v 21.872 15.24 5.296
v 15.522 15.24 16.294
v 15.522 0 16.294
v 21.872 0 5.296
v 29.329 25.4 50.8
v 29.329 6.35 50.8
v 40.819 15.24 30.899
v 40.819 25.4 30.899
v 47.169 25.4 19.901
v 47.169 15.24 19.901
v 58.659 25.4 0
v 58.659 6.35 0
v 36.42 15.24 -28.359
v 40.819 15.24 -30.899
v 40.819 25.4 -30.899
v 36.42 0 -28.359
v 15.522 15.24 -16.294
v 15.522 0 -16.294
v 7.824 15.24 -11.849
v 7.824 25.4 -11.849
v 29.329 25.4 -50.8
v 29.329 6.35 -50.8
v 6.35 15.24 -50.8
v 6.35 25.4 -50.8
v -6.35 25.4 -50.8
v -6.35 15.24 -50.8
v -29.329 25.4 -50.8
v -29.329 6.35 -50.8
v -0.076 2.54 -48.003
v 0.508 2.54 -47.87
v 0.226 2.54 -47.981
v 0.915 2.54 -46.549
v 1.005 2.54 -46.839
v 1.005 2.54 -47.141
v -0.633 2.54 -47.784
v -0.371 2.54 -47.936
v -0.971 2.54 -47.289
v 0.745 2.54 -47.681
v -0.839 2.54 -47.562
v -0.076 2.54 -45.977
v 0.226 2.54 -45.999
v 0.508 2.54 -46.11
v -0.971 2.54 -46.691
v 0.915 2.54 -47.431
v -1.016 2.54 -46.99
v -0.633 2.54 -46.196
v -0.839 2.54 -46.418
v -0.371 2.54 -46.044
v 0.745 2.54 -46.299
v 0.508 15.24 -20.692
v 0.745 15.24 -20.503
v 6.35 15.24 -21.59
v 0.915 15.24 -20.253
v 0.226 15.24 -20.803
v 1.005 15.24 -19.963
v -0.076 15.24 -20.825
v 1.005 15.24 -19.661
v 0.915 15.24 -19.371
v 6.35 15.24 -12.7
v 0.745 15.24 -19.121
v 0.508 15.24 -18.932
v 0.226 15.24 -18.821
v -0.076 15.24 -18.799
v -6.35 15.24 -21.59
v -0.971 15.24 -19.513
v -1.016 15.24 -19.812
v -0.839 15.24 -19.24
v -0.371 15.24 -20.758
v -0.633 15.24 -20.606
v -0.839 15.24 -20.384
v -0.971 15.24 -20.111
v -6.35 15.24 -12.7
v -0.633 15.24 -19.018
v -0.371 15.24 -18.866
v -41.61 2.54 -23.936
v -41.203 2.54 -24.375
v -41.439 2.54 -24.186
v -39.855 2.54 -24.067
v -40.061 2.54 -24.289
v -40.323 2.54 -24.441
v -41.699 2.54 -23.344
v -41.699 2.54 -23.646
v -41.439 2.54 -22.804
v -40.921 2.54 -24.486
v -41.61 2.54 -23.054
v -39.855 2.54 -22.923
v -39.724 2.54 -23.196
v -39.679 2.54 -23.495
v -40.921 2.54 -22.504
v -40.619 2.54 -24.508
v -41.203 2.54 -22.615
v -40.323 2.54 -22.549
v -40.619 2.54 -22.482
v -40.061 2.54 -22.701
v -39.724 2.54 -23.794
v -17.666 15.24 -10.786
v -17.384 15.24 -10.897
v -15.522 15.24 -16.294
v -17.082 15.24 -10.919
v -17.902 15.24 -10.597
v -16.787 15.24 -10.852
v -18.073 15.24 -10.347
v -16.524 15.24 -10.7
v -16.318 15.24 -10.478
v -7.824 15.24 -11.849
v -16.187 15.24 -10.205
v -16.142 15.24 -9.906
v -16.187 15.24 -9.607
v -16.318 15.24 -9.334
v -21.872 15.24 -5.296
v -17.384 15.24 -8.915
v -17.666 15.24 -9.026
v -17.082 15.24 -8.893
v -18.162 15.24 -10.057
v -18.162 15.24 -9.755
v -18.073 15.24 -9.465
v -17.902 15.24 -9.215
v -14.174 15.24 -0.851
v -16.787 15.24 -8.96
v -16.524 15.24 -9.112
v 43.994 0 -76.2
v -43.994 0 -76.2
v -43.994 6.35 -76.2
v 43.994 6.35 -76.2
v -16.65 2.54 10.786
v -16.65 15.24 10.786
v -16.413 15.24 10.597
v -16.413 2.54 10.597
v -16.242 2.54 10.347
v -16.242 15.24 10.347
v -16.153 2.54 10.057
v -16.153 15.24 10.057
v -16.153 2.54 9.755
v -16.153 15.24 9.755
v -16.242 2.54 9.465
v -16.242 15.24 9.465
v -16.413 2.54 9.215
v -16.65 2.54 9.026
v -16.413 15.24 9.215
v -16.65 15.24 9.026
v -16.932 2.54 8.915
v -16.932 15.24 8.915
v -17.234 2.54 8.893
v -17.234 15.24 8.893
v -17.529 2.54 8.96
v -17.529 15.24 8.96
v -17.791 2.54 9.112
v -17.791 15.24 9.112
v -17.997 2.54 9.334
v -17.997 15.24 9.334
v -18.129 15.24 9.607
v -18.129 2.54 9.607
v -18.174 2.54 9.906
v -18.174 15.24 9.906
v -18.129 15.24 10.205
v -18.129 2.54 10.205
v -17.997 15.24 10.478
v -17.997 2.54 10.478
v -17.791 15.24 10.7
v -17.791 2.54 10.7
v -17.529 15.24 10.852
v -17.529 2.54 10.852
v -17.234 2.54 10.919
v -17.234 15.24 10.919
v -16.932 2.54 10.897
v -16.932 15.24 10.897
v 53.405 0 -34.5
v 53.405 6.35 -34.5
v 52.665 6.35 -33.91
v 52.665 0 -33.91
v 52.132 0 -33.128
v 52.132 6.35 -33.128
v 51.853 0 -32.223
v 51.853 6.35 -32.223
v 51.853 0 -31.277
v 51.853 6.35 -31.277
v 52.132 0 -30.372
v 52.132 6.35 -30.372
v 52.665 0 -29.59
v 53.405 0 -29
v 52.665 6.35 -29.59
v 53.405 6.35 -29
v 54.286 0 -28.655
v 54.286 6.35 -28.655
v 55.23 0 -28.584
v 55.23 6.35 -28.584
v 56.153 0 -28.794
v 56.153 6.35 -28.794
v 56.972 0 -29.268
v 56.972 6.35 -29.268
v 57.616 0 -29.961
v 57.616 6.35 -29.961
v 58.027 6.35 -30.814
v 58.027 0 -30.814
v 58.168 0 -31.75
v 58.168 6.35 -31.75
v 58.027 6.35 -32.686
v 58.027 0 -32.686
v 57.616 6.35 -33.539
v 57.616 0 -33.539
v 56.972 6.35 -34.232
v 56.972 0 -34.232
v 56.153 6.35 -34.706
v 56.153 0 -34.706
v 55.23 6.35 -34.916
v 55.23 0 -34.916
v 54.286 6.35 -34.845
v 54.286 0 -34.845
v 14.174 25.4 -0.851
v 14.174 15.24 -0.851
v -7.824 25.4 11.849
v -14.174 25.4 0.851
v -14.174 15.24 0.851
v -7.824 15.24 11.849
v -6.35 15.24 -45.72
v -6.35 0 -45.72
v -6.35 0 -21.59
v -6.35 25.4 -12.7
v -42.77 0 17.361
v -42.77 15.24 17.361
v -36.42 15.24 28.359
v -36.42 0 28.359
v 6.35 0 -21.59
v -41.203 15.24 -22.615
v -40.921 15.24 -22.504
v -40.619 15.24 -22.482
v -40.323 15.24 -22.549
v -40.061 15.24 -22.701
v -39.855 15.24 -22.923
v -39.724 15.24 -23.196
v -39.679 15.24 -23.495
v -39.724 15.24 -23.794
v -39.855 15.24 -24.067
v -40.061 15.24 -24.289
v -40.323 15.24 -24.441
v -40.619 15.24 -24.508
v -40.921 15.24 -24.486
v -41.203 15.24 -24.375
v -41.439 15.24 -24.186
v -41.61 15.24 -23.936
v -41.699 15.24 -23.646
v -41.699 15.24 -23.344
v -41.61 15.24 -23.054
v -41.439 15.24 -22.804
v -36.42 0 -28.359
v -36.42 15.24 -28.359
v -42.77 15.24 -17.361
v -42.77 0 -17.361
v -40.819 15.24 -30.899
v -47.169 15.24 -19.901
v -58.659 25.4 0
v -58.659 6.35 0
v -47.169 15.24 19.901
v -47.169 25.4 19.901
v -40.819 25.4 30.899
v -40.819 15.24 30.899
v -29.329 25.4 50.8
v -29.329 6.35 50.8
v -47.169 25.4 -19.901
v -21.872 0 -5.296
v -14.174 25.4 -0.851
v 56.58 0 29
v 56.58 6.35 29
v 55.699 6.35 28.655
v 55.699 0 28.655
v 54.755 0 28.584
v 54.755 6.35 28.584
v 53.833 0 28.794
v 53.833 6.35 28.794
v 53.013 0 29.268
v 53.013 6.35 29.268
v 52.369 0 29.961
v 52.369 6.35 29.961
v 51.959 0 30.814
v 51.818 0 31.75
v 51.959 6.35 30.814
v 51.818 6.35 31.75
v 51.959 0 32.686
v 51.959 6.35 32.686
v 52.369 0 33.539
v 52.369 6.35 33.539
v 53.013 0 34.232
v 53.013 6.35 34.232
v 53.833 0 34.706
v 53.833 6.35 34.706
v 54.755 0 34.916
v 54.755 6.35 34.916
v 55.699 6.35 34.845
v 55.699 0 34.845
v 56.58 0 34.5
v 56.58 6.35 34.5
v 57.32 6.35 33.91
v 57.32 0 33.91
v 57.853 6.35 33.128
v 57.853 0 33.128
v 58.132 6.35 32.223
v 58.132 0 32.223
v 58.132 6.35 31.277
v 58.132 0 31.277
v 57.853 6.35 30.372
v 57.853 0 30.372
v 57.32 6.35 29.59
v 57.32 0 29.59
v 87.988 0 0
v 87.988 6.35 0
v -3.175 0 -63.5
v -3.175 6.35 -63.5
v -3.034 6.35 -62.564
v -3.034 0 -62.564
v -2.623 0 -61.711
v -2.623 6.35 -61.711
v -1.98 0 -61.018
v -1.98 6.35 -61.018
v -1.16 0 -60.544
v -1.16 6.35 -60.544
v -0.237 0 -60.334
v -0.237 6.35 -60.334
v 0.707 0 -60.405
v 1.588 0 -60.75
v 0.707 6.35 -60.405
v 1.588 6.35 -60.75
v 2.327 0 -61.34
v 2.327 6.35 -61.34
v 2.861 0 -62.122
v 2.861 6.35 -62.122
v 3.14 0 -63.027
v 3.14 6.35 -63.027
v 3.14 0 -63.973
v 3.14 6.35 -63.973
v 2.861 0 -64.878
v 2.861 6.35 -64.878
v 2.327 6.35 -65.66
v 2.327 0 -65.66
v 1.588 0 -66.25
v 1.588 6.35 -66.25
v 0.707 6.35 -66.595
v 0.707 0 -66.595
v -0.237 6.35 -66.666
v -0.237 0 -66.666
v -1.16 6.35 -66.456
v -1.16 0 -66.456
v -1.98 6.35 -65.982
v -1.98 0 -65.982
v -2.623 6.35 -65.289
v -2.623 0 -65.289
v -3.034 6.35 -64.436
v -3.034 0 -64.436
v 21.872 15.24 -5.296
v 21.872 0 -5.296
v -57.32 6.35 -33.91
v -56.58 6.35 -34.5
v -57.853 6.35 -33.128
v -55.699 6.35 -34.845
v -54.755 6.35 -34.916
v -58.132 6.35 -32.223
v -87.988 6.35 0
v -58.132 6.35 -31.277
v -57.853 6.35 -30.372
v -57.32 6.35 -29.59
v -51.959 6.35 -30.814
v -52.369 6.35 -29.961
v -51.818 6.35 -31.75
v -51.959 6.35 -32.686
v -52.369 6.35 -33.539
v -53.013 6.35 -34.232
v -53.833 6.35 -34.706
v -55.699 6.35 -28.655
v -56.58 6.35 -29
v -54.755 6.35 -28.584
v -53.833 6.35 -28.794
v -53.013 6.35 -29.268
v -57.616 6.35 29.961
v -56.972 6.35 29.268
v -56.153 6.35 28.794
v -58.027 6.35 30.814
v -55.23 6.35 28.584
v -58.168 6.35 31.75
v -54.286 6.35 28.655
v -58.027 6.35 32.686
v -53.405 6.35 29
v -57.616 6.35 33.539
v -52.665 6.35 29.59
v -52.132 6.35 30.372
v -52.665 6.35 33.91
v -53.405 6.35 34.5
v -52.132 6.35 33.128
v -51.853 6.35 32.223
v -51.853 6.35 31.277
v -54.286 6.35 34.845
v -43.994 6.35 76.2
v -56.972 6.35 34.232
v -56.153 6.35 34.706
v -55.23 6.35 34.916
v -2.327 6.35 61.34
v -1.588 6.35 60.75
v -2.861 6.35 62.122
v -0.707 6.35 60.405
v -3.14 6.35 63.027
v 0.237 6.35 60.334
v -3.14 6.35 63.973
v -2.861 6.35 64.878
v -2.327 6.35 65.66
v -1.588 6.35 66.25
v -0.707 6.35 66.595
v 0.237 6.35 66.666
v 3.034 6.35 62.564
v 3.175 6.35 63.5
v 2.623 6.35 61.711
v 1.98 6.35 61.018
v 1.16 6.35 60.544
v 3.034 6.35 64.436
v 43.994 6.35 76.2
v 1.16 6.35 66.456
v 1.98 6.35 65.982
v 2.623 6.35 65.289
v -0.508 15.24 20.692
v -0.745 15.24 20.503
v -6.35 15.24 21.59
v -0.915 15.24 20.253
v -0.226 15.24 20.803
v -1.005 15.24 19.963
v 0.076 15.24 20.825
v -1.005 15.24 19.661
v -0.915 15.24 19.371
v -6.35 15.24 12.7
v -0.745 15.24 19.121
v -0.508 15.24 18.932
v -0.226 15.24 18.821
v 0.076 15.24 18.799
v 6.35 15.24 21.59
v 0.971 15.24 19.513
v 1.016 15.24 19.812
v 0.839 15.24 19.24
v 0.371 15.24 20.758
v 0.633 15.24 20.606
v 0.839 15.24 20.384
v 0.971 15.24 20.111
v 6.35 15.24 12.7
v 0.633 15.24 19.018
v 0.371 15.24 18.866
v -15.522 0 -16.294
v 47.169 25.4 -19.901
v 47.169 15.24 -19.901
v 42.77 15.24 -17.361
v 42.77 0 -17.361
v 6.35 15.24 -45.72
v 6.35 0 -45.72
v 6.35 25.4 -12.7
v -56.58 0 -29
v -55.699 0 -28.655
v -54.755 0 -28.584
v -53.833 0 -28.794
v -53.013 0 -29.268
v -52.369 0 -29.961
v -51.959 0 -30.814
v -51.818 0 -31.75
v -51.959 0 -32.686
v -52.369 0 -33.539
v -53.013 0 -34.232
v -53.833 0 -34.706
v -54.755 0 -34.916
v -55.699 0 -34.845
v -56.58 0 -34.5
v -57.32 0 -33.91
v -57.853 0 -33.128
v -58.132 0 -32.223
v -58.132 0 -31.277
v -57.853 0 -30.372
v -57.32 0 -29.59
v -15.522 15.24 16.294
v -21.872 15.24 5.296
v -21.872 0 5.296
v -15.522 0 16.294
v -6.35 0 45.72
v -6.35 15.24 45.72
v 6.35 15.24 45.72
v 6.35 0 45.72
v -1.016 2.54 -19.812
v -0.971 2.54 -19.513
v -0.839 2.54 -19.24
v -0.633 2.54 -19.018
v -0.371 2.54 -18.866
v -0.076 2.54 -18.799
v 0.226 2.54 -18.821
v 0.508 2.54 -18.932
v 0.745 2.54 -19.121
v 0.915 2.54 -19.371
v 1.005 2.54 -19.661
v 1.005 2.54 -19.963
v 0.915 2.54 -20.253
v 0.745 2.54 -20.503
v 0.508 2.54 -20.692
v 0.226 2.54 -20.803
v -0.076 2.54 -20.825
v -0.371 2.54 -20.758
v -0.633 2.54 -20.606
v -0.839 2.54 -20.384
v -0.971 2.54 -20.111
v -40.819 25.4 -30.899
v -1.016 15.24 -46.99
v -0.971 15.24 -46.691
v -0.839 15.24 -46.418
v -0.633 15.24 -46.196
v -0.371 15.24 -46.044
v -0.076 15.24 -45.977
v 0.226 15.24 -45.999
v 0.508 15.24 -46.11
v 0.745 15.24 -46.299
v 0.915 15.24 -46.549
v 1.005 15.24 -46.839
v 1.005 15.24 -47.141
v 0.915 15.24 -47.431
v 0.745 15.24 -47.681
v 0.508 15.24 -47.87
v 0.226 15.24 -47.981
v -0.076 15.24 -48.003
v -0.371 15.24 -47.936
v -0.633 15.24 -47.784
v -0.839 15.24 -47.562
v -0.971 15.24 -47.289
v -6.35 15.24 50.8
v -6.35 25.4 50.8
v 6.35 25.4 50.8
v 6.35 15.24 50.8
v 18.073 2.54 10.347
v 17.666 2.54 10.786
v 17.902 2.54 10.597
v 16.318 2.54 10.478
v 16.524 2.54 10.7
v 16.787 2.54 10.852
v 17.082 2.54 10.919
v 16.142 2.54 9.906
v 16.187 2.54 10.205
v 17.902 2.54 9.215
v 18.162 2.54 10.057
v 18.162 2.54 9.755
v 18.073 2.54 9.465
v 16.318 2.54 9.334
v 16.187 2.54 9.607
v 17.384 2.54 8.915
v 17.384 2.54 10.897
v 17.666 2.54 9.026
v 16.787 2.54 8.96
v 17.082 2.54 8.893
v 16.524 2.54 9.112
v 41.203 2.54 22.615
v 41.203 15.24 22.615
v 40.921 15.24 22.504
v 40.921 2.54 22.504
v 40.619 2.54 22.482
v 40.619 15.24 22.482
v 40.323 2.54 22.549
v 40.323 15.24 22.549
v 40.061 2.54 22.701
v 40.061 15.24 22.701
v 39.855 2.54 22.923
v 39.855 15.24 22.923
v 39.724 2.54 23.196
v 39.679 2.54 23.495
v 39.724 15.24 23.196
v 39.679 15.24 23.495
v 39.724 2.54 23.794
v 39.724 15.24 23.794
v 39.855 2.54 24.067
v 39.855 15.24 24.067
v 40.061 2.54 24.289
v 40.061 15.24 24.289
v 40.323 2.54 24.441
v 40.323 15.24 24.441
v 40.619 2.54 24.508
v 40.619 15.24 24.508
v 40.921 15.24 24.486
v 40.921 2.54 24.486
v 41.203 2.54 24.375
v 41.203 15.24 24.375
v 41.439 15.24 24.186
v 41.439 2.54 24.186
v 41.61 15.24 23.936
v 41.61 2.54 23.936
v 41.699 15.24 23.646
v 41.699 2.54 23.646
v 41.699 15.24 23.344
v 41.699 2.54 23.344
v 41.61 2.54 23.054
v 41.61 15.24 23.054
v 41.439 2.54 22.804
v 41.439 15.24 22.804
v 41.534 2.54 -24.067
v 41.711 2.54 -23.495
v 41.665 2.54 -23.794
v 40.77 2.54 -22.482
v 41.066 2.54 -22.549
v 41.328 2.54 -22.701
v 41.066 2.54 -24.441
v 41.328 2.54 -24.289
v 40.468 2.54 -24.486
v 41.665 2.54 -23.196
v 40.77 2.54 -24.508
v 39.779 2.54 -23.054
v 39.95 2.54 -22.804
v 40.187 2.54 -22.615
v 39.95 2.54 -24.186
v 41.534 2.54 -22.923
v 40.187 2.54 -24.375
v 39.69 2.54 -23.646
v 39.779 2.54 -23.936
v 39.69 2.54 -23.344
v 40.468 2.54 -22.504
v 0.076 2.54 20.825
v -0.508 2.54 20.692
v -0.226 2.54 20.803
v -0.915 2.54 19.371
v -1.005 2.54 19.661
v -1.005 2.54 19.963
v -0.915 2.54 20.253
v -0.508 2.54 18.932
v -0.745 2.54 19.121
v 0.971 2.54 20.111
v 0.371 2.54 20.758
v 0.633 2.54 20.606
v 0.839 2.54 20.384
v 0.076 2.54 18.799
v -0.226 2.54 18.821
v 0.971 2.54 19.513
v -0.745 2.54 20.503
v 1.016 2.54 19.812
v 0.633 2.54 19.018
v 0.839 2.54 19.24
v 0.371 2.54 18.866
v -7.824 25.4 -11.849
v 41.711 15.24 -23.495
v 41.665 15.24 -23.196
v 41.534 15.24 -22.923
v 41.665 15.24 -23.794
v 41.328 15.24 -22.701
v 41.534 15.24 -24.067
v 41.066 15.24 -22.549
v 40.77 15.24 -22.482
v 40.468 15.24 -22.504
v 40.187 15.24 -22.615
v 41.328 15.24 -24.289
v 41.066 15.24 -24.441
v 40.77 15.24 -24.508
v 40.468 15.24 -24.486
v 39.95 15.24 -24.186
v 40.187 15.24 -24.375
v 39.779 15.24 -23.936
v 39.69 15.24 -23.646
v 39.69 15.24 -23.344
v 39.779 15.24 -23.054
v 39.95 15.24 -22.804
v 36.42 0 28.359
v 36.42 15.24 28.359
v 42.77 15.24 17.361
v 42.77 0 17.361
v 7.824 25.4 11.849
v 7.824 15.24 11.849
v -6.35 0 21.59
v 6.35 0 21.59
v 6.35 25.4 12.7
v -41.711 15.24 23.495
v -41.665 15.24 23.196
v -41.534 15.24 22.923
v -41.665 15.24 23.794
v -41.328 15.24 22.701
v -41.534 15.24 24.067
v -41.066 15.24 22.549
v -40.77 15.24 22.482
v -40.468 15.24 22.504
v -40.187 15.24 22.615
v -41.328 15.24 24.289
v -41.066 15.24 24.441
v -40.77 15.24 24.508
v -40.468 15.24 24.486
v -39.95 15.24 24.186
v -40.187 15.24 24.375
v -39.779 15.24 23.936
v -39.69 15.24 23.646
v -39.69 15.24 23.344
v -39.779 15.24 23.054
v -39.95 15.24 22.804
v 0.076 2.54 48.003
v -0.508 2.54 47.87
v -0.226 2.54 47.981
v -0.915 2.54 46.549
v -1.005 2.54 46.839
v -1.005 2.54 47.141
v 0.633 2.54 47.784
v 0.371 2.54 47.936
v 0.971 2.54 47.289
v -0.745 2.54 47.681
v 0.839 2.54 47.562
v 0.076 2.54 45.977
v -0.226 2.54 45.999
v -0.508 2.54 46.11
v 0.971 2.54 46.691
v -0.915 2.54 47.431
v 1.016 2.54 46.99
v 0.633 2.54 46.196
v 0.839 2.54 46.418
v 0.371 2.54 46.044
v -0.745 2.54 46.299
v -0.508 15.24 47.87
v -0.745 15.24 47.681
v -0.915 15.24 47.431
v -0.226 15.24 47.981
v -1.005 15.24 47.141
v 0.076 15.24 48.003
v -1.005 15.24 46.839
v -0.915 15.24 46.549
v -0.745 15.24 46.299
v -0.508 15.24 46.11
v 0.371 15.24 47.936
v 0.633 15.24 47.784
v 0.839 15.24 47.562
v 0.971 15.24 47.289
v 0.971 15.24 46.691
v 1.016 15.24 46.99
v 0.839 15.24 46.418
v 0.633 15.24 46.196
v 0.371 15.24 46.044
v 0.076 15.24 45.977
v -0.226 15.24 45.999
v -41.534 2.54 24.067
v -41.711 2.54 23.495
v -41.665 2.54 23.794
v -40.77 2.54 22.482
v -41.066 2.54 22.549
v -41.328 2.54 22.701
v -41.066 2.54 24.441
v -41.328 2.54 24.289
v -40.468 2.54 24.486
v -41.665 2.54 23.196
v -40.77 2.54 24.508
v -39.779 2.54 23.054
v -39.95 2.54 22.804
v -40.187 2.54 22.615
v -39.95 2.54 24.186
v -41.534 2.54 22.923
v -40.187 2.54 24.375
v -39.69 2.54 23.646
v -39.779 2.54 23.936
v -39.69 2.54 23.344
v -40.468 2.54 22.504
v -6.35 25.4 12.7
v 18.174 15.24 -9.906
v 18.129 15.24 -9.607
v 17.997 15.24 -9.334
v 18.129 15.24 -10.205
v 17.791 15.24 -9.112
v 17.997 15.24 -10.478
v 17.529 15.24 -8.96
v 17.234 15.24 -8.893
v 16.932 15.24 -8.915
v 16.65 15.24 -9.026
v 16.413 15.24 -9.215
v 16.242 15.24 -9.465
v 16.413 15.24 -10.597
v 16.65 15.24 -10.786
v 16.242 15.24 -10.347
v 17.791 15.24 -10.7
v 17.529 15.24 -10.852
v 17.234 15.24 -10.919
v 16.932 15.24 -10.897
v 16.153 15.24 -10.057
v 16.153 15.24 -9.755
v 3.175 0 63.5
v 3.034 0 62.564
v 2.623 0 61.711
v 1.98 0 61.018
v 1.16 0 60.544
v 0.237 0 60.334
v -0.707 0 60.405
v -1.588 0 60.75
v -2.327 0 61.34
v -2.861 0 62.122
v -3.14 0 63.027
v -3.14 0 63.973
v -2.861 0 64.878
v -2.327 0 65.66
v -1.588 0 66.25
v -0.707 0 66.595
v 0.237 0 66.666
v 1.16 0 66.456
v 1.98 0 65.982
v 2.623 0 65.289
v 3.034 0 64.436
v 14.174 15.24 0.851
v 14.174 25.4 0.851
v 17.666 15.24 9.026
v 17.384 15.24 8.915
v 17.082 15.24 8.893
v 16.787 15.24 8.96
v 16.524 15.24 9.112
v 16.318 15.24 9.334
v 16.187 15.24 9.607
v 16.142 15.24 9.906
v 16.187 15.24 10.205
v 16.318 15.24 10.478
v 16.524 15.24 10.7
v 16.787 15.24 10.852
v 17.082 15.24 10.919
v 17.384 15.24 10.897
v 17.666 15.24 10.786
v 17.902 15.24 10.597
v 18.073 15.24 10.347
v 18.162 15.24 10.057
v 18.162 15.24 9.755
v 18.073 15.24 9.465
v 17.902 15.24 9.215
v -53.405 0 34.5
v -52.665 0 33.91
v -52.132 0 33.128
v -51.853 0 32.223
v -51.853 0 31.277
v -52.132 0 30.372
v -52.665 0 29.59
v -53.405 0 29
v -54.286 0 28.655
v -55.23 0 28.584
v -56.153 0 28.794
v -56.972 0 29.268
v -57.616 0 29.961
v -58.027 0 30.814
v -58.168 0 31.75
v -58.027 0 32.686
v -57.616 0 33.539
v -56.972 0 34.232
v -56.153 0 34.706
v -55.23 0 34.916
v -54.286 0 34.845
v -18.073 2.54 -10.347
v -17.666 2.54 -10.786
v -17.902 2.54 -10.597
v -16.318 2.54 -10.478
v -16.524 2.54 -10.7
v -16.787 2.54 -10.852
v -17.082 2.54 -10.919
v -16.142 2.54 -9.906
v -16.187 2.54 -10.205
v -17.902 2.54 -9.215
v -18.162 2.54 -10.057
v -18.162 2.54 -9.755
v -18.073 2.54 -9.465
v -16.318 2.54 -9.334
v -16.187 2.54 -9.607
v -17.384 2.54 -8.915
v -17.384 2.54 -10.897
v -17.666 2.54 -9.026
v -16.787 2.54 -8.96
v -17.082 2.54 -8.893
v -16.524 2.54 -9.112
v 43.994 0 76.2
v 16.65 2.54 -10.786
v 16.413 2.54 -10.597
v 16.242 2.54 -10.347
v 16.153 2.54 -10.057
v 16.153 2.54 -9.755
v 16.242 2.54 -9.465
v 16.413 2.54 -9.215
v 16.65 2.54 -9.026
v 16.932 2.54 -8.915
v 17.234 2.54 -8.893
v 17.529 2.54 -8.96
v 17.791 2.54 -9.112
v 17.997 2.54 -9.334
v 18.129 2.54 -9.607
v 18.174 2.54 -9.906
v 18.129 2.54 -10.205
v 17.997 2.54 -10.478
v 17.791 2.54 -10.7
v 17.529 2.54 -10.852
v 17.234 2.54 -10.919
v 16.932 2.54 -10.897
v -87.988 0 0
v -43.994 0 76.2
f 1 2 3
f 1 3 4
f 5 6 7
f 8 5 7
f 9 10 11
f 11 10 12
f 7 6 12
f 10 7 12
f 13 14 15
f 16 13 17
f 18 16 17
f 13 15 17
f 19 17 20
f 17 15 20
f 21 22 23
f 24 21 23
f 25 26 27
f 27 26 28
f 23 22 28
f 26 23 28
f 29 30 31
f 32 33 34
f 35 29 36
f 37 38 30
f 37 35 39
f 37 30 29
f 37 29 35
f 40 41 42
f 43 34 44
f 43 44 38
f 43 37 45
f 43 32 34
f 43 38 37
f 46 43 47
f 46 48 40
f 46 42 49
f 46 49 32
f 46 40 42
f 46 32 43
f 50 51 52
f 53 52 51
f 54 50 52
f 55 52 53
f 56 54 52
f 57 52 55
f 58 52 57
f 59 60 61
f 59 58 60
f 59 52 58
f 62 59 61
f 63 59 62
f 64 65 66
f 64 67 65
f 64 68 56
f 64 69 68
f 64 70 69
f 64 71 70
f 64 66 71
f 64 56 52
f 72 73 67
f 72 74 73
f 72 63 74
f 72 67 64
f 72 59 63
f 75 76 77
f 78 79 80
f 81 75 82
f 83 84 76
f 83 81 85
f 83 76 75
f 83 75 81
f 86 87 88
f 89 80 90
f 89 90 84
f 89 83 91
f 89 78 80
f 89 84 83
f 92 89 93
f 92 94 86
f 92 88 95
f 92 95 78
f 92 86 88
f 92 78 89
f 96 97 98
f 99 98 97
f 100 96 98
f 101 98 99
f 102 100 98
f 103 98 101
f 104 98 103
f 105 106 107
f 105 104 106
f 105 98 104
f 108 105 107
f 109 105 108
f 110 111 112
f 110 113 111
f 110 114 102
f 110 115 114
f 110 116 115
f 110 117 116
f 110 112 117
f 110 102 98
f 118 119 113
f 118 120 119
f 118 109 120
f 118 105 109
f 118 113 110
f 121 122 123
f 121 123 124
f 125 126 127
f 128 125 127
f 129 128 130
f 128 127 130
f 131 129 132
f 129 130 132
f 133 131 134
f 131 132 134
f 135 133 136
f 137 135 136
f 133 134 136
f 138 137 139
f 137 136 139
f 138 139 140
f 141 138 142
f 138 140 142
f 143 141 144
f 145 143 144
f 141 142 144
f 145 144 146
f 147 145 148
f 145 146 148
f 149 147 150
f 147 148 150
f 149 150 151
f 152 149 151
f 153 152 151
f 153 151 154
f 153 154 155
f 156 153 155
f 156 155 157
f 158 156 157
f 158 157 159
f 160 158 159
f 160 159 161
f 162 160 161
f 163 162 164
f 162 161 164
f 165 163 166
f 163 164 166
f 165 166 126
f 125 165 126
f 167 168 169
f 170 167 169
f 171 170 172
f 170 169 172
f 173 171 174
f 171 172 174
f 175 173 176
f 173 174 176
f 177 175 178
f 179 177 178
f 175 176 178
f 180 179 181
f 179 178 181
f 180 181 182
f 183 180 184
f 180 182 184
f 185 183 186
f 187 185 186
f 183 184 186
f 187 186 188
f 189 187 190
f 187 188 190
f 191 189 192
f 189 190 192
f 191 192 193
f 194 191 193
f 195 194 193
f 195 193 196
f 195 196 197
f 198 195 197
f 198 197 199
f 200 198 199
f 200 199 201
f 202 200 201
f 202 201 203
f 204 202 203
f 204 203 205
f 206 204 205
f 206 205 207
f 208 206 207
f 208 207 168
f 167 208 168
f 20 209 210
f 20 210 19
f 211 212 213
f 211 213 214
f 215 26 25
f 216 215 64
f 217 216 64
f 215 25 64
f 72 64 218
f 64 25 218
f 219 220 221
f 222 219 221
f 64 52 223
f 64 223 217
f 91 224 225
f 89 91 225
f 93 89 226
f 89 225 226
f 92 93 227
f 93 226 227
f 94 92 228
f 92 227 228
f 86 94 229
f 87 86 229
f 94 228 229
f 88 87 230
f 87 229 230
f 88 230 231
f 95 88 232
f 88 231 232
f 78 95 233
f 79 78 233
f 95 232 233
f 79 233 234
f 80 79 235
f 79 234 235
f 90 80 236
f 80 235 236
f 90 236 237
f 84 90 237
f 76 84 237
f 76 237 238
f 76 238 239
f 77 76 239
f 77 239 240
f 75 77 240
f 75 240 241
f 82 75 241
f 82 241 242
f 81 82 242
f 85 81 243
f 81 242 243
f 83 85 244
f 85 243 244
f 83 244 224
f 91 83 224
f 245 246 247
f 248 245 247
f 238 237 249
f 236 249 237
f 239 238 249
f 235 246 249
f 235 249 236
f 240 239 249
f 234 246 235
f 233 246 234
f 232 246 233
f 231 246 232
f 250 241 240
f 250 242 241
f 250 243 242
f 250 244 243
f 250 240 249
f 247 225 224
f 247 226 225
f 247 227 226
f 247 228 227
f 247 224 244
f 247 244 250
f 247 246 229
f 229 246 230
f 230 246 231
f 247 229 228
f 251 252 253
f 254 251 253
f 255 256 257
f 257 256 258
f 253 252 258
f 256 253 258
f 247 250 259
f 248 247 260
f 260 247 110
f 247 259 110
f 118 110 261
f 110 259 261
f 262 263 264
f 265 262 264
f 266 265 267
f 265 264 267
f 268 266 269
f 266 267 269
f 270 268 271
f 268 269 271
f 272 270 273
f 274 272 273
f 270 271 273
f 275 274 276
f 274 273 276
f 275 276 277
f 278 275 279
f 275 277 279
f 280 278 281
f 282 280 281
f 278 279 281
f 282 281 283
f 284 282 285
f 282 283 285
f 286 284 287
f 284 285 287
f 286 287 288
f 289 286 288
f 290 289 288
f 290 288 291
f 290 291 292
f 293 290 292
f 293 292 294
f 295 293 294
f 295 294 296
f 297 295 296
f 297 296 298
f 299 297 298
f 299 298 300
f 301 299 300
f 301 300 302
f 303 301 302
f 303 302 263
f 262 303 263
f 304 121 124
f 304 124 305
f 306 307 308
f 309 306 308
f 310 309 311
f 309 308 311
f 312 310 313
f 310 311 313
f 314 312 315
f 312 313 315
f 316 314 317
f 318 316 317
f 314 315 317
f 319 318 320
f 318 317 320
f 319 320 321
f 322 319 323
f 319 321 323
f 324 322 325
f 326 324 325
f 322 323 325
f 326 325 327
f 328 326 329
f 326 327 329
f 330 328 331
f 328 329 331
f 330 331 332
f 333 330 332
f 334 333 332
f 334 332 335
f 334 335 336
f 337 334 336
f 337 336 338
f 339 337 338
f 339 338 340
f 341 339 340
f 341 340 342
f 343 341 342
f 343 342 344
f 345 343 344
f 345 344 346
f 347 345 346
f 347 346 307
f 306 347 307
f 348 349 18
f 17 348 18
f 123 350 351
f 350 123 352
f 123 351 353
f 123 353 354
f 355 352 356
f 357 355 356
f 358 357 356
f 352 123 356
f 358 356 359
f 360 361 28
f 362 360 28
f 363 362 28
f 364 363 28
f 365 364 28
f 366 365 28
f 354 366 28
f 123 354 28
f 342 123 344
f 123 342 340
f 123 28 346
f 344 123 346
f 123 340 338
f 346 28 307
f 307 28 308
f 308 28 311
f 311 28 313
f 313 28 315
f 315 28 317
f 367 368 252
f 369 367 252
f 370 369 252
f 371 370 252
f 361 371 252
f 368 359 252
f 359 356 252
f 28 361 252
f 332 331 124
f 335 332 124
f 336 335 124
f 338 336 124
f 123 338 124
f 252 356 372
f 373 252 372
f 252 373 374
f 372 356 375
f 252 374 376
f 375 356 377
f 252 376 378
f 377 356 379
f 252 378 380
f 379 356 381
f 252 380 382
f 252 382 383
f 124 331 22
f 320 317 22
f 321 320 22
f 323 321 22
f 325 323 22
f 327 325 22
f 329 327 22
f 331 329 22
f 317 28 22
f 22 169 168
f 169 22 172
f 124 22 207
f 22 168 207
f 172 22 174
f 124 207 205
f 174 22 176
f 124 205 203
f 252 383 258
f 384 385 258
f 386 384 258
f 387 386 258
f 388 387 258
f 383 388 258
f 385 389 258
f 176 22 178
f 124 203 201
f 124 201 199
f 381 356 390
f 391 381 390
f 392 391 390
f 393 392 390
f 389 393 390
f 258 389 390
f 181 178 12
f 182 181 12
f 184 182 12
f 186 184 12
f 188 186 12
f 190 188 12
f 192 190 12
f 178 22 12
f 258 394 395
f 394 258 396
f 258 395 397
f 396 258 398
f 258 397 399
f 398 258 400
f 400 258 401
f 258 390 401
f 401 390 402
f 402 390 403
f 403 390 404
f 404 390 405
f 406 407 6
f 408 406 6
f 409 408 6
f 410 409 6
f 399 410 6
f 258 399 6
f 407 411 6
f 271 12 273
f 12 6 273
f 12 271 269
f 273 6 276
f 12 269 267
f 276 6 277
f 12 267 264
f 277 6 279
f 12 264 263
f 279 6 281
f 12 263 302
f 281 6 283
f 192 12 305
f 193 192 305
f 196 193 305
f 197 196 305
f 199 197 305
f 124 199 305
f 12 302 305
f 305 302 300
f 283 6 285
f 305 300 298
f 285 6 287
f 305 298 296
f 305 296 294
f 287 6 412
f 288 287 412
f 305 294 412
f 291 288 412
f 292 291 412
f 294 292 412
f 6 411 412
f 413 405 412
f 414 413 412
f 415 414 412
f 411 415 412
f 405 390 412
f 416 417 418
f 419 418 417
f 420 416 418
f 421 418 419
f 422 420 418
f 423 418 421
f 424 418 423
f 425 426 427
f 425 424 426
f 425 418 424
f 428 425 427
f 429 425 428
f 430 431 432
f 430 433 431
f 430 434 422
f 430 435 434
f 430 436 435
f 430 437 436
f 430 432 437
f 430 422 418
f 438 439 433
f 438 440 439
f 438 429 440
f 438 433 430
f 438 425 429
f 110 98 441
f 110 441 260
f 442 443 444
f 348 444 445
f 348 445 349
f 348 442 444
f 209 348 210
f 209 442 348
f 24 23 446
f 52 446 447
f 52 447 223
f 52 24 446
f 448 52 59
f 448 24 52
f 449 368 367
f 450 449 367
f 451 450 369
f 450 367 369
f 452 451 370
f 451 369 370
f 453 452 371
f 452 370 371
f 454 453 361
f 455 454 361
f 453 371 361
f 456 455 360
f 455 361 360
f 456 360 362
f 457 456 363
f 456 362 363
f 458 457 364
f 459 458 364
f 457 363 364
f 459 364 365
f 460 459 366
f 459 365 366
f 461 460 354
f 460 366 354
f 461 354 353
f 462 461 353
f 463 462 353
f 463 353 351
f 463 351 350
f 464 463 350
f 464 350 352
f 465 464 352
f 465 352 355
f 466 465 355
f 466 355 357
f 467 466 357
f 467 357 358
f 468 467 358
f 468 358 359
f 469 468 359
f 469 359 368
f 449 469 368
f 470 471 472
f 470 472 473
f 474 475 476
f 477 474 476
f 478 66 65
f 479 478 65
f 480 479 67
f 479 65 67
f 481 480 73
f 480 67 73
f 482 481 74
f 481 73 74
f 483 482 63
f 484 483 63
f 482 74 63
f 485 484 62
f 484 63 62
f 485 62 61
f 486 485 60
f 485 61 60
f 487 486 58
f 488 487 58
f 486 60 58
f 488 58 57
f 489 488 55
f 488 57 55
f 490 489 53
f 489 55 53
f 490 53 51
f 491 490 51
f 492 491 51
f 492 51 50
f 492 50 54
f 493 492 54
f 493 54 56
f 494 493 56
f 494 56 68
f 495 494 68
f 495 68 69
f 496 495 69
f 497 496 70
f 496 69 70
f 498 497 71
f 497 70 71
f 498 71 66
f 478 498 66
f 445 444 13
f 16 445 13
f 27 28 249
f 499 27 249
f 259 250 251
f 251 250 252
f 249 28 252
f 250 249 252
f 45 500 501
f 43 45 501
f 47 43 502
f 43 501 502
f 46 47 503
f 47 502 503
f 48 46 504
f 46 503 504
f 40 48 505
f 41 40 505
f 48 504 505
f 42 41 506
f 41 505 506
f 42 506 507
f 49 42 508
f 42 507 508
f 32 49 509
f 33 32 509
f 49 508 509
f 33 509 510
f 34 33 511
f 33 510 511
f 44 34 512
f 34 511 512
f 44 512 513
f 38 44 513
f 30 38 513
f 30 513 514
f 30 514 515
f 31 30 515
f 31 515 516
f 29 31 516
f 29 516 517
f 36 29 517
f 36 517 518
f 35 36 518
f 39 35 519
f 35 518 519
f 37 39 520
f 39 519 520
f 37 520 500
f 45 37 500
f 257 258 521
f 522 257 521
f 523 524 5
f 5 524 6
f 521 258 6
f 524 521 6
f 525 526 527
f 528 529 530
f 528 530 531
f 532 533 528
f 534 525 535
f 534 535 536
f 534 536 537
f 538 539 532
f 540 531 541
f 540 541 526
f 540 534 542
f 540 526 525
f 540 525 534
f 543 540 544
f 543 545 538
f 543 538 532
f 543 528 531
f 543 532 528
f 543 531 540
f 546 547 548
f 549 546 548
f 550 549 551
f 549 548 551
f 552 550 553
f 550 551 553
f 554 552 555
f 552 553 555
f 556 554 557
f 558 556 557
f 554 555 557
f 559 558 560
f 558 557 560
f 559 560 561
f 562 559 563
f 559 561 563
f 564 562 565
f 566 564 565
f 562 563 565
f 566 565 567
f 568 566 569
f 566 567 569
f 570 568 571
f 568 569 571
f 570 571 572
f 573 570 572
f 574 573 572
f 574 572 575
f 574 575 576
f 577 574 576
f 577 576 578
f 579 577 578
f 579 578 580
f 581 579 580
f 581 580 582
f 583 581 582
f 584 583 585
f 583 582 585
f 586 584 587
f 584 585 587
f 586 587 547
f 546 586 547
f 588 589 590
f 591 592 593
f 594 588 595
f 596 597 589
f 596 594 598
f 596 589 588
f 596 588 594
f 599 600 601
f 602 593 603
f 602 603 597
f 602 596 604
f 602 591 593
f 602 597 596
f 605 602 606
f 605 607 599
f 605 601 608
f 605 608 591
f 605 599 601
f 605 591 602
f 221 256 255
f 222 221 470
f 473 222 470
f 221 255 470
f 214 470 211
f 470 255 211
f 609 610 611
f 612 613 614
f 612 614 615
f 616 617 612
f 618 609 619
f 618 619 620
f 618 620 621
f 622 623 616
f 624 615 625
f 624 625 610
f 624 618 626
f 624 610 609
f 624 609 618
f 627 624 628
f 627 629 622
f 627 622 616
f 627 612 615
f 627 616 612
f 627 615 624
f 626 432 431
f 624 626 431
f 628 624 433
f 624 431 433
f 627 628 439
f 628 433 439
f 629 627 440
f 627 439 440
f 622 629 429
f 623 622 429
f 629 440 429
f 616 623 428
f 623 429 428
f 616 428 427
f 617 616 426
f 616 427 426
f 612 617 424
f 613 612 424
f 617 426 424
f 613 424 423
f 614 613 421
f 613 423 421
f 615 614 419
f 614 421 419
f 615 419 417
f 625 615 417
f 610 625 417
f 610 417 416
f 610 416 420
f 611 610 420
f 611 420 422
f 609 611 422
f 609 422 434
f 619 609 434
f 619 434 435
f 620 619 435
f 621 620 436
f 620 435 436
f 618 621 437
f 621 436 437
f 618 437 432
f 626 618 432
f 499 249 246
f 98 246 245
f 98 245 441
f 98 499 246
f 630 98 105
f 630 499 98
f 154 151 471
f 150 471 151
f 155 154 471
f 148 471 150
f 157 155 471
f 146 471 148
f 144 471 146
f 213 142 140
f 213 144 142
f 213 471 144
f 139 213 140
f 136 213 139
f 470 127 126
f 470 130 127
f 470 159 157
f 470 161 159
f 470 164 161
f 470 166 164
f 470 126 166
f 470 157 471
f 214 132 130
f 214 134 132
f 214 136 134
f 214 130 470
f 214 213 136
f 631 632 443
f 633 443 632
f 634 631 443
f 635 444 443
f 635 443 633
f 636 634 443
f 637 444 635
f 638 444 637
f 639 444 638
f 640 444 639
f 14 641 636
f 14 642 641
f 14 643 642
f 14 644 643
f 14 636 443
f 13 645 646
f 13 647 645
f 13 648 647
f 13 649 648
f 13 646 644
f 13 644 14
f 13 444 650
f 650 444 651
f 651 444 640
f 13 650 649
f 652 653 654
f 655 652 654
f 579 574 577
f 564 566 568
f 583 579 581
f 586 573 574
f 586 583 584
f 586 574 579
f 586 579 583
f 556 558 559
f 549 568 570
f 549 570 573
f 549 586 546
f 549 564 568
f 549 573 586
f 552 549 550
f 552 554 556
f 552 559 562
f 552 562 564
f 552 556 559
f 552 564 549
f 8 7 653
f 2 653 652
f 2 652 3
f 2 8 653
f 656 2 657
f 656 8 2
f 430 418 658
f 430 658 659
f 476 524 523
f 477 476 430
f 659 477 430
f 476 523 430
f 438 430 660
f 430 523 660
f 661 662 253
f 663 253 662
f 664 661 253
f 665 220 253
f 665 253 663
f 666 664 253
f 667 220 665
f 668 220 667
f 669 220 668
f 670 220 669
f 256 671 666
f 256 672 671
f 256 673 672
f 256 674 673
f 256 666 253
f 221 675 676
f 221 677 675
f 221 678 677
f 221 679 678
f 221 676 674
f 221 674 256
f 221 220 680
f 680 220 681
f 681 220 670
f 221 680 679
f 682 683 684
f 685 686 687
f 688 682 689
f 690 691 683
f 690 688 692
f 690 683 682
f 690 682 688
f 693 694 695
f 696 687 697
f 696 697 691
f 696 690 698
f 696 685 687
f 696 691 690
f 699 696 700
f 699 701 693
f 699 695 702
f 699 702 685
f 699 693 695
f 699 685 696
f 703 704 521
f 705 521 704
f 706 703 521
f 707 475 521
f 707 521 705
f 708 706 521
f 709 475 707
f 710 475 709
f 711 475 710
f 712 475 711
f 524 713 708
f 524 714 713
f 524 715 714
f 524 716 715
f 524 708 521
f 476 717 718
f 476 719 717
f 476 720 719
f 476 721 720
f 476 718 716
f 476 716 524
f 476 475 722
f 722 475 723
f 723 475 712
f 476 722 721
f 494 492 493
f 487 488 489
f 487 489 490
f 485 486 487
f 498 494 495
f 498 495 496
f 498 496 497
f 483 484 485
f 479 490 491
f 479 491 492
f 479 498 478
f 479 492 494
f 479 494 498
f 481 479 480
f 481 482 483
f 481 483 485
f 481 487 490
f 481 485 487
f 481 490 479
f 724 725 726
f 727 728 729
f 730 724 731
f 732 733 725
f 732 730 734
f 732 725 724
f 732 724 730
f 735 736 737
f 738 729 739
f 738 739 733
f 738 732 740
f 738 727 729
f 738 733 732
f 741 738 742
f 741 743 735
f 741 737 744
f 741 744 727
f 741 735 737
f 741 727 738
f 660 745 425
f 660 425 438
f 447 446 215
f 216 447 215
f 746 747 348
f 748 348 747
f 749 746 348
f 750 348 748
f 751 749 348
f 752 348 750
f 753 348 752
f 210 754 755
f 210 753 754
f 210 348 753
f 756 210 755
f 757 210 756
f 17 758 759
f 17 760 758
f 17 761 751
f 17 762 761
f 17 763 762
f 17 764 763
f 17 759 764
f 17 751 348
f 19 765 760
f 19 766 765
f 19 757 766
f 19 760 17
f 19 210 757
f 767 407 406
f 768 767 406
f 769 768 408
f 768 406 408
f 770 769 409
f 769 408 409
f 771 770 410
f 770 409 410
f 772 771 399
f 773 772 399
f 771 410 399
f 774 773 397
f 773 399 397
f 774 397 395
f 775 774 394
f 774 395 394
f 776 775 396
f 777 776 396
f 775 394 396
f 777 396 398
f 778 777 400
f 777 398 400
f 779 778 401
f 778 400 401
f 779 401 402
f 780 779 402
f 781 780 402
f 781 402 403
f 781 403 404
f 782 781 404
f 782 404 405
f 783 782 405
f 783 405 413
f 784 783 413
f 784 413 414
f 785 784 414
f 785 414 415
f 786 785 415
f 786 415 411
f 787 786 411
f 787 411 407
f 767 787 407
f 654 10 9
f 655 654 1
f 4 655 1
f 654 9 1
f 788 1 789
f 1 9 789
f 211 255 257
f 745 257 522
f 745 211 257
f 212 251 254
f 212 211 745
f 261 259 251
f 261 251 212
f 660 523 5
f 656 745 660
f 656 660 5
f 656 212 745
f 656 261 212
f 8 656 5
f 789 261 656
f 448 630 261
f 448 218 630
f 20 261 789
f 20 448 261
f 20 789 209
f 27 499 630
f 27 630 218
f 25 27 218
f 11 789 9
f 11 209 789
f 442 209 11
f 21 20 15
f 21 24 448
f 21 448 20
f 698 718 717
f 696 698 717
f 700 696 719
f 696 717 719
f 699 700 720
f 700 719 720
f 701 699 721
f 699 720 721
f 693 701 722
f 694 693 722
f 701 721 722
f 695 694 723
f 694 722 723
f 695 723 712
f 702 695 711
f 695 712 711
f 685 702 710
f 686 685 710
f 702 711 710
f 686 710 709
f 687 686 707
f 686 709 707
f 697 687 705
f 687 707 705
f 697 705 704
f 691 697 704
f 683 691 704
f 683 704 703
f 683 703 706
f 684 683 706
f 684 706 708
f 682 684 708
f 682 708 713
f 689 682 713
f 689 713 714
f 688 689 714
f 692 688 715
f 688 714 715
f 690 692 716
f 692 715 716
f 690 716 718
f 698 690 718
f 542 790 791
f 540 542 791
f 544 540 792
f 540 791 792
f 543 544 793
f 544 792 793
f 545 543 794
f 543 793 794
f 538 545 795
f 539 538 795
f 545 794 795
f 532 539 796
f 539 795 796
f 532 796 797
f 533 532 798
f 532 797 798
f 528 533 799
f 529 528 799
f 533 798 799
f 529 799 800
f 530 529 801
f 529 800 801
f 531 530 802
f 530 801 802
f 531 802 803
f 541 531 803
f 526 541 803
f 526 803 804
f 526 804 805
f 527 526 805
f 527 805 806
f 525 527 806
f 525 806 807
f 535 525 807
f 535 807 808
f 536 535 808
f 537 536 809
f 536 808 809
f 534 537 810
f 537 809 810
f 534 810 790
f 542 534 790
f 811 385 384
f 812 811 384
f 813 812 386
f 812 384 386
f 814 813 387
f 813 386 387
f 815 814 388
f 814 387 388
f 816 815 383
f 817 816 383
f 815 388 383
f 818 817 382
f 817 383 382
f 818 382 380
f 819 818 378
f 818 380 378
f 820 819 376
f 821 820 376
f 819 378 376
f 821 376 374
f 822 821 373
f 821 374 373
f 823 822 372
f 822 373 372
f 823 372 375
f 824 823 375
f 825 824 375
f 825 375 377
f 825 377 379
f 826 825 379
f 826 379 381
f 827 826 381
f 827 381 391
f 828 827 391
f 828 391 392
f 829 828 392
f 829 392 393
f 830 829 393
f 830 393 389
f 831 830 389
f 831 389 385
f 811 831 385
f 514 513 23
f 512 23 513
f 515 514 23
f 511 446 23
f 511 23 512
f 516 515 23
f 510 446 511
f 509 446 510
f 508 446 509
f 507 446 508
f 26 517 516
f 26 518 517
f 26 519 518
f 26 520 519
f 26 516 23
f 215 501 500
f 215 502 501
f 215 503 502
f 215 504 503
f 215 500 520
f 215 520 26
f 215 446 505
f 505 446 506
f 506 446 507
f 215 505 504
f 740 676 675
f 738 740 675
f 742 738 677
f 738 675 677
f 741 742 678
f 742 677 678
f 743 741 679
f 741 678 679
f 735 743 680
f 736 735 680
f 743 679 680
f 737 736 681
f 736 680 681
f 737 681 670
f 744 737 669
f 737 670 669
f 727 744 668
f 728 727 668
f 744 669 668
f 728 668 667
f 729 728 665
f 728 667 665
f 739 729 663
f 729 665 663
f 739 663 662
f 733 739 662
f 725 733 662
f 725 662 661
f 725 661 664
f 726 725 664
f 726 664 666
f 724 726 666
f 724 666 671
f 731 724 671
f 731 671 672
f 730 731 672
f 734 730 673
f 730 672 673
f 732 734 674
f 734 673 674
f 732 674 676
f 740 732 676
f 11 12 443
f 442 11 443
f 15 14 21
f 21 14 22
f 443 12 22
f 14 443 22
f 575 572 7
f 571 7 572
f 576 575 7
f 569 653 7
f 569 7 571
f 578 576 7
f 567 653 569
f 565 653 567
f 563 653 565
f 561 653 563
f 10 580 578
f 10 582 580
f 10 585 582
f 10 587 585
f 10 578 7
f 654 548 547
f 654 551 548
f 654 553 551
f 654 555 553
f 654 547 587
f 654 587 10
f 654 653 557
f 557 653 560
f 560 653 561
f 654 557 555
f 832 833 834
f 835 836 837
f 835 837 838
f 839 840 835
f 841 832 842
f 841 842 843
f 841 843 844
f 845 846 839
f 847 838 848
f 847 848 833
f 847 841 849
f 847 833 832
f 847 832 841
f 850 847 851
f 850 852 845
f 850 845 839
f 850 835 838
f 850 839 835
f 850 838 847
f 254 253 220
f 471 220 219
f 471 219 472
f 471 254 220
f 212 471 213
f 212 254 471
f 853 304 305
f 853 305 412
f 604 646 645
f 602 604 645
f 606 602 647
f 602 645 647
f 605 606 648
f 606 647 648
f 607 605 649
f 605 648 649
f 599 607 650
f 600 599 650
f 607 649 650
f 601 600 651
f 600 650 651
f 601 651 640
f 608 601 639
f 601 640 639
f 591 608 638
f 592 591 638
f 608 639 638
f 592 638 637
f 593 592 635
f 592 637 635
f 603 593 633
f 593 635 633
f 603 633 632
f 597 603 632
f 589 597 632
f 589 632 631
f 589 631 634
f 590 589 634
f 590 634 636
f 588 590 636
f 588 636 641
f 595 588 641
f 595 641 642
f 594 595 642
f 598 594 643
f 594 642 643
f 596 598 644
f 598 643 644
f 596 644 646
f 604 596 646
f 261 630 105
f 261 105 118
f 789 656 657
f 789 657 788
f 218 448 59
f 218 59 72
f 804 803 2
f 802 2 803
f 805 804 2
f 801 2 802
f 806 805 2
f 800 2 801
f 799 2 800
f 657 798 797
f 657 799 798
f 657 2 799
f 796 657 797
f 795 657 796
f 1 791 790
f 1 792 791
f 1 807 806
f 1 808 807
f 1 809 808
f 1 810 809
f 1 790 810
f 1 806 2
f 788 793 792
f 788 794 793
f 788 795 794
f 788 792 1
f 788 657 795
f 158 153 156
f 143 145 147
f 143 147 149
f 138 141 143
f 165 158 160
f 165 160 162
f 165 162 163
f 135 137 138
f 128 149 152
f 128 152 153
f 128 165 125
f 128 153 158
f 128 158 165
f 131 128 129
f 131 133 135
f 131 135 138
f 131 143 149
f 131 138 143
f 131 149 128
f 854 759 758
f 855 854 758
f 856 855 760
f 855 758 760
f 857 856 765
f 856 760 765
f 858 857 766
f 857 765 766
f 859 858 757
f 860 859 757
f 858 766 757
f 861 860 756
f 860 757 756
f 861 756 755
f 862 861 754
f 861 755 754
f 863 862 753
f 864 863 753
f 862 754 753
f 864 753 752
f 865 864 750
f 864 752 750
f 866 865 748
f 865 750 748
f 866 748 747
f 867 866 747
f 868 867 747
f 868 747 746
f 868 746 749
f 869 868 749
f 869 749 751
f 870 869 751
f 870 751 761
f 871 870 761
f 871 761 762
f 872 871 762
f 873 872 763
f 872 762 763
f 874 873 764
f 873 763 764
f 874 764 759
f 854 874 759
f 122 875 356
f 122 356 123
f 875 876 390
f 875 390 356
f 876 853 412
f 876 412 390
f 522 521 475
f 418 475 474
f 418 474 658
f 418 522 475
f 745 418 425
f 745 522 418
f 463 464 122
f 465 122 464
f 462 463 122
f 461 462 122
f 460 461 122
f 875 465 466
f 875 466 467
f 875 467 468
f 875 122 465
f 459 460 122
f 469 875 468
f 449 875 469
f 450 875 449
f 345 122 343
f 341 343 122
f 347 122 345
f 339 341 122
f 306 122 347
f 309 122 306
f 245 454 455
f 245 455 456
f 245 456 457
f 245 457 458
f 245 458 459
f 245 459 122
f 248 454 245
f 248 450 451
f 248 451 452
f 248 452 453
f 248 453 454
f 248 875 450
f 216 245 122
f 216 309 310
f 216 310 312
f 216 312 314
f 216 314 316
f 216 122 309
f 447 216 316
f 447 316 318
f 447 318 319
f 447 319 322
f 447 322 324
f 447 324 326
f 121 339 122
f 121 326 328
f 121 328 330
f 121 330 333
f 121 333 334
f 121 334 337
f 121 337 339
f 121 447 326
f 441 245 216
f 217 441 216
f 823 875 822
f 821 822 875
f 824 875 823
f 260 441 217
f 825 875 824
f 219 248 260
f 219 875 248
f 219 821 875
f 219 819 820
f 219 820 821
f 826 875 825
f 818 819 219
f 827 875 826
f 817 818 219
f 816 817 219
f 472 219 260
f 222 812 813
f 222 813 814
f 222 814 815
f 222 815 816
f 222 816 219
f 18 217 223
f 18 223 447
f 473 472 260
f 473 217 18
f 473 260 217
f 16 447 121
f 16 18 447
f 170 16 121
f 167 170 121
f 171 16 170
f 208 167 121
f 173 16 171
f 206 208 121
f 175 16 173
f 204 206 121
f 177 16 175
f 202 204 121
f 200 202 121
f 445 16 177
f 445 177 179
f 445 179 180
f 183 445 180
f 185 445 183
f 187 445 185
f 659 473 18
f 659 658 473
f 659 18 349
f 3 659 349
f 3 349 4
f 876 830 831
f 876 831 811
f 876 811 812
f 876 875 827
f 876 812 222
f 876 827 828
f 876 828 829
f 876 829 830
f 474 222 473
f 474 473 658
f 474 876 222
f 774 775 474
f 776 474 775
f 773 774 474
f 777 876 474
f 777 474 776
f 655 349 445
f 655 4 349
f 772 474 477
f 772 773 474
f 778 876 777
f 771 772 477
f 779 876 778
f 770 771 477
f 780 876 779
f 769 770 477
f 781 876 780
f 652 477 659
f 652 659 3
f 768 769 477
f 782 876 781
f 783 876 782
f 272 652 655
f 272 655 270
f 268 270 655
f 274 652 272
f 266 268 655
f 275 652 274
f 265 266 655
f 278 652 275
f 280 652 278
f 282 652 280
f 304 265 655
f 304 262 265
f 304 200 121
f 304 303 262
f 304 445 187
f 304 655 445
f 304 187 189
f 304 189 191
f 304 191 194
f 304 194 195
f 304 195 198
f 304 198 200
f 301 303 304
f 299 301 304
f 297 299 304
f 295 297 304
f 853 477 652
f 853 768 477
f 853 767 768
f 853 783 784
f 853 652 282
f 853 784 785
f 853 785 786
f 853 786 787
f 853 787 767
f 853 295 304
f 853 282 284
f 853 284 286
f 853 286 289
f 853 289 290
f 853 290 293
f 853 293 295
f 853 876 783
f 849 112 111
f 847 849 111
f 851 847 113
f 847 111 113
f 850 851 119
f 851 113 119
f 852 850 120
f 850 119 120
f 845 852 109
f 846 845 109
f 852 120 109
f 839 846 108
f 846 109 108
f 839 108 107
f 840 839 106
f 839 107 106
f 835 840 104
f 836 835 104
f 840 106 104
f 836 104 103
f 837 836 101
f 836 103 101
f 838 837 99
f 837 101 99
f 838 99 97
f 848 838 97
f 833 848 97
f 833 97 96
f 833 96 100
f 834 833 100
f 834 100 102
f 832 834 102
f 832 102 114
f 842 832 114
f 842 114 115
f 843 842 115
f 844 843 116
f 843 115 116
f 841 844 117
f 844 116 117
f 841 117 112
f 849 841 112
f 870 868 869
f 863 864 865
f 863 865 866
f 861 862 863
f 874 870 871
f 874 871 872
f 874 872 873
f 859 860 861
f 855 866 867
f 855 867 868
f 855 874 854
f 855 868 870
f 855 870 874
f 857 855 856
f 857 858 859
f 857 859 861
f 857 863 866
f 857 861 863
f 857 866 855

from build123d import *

# Parameters (mm, degrees)
BOSS_EXTRUDE1_DEPTH = 25.4
BOSS_EXTRUDE2_DEPTH = 6.35
SKETCH2_W           = 12.7
SKETCH2_H           = 38.1
CUT_EXTRUDE1_DEPTH  = 10.16
SKETCH3_W           = 12.7
SKETCH3_H           = 24.13
CUT_EXTRUDE2_DEPTH  = 118.390875284
SKETCH4_R           = 1.016
CUT_EXTRUDE3_DEPTH  = 12.7
SKETCH6_R           = 3.175
CUT_EXTRUDE4_DEPTH  = 118.946015193
CIRPATTERN1_COUNT   = 6


with BuildPart() as part:
    # Sketch1 → Boss-Extrude1 (new body)
    with BuildSketch(Plane(origin=(0, 0, 0), x_dir=(1, 0, 0), z_dir=(0, 1, 0))):
        Polygon((58.65878735, 0), (29.329393675, 50.8), (-29.329393675, 50.8), (-58.65878735, 0), (-29.329393675, -50.8), (29.329393675, -50.8), align=None)
    extrude(amount=BOSS_EXTRUDE1_DEPTH)

    # Sketch5 → Boss-Extrude2 (add)
    with BuildSketch(Plane.XZ):
        Polygon((87.988181024, 0), (43.994090512, 76.2), (-43.994090512, 76.2), (-87.988181024, 0), (-43.994090512, -76.2), (43.994090512, -76.2), align=None)
        Polygon((58.65878735, 0), (29.329393675, 50.8), (-29.329393675, 50.8), (-58.65878735, 0), (-29.329393675, -50.8), (29.329393675, -50.8), align=None, mode=Mode.SUBTRACT)
    extrude(amount=-BOSS_EXTRUDE2_DEPTH)

    # Sketch2 → Cut-Extrude1 (cut)
    with BuildSketch(Plane(origin=(0, 25.4, 0), x_dir=(1, 0, 0), z_dir=(0, 1, 0))):
        with Locations((0, -31.75)):
            Rectangle(SKETCH2_W, SKETCH2_H)
    cut_extrude1 = extrude(amount=-CUT_EXTRUDE1_DEPTH, mode=Mode.SUBTRACT)

    # Sketch3 → Cut-Extrude2 (cut, through all)
    with BuildSketch(Plane(origin=(0, 15.24, 0), x_dir=(1, 0, 0), z_dir=(0, 1, 0))):
        with Locations((0, -33.655)):
            Rectangle(SKETCH3_W, SKETCH3_H)
    cut_extrude2 = extrude(amount=-CUT_EXTRUDE2_DEPTH, mode=Mode.SUBTRACT)

    # Sketch4 → Cut-Extrude3 (cut)
    with BuildSketch(Plane(origin=(0, 15.24, 0), x_dir=(1, 0, 0), z_dir=(0, 1, 0))):
        with Locations((0, -19.812)):
            Circle(SKETCH4_R)
        with Locations((0, -46.99)):
            Circle(SKETCH4_R)
    cut_extrude3 = extrude(amount=-CUT_EXTRUDE3_DEPTH, mode=Mode.SUBTRACT)

    # Sketch6 → Cut-Extrude4 (cut, through all)
    with BuildSketch(Plane(origin=(0, 6.35, 0), x_dir=(1, 0, 0), z_dir=(0, 1, 0))):
        with Locations((0, -63.5)):
            Circle(SKETCH6_R)
    cut_extrude4 = extrude(amount=-CUT_EXTRUDE4_DEPTH, mode=Mode.SUBTRACT)

    # CirPattern1: Cut-Extrude1, Cut-Extrude2, Cut-Extrude3, Cut-Extrude4 ×6 about axis
    cirpattern1_axis = Axis((0, 26.67, 0), (0, -1, 0))
    add([cut_extrude1.rotate(cirpattern1_axis, i * 360 / CIRPATTERN1_COUNT) for i in range(1, CIRPATTERN1_COUNT)], mode=Mode.SUBTRACT)
    add([cut_extrude2.rotate(cirpattern1_axis, i * 360 / CIRPATTERN1_COUNT) for i in range(1, CIRPATTERN1_COUNT)], mode=Mode.SUBTRACT)
    add([cut_extrude3.rotate(cirpattern1_axis, i * 360 / CIRPATTERN1_COUNT) for i in range(1, CIRPATTERN1_COUNT)], mode=Mode.SUBTRACT)
    add([cut_extrude4.rotate(cirpattern1_axis, i * 360 / CIRPATTERN1_COUNT) for i in range(1, CIRPATTERN1_COUNT)], mode=Mode.SUBTRACT)


solid = part.part
